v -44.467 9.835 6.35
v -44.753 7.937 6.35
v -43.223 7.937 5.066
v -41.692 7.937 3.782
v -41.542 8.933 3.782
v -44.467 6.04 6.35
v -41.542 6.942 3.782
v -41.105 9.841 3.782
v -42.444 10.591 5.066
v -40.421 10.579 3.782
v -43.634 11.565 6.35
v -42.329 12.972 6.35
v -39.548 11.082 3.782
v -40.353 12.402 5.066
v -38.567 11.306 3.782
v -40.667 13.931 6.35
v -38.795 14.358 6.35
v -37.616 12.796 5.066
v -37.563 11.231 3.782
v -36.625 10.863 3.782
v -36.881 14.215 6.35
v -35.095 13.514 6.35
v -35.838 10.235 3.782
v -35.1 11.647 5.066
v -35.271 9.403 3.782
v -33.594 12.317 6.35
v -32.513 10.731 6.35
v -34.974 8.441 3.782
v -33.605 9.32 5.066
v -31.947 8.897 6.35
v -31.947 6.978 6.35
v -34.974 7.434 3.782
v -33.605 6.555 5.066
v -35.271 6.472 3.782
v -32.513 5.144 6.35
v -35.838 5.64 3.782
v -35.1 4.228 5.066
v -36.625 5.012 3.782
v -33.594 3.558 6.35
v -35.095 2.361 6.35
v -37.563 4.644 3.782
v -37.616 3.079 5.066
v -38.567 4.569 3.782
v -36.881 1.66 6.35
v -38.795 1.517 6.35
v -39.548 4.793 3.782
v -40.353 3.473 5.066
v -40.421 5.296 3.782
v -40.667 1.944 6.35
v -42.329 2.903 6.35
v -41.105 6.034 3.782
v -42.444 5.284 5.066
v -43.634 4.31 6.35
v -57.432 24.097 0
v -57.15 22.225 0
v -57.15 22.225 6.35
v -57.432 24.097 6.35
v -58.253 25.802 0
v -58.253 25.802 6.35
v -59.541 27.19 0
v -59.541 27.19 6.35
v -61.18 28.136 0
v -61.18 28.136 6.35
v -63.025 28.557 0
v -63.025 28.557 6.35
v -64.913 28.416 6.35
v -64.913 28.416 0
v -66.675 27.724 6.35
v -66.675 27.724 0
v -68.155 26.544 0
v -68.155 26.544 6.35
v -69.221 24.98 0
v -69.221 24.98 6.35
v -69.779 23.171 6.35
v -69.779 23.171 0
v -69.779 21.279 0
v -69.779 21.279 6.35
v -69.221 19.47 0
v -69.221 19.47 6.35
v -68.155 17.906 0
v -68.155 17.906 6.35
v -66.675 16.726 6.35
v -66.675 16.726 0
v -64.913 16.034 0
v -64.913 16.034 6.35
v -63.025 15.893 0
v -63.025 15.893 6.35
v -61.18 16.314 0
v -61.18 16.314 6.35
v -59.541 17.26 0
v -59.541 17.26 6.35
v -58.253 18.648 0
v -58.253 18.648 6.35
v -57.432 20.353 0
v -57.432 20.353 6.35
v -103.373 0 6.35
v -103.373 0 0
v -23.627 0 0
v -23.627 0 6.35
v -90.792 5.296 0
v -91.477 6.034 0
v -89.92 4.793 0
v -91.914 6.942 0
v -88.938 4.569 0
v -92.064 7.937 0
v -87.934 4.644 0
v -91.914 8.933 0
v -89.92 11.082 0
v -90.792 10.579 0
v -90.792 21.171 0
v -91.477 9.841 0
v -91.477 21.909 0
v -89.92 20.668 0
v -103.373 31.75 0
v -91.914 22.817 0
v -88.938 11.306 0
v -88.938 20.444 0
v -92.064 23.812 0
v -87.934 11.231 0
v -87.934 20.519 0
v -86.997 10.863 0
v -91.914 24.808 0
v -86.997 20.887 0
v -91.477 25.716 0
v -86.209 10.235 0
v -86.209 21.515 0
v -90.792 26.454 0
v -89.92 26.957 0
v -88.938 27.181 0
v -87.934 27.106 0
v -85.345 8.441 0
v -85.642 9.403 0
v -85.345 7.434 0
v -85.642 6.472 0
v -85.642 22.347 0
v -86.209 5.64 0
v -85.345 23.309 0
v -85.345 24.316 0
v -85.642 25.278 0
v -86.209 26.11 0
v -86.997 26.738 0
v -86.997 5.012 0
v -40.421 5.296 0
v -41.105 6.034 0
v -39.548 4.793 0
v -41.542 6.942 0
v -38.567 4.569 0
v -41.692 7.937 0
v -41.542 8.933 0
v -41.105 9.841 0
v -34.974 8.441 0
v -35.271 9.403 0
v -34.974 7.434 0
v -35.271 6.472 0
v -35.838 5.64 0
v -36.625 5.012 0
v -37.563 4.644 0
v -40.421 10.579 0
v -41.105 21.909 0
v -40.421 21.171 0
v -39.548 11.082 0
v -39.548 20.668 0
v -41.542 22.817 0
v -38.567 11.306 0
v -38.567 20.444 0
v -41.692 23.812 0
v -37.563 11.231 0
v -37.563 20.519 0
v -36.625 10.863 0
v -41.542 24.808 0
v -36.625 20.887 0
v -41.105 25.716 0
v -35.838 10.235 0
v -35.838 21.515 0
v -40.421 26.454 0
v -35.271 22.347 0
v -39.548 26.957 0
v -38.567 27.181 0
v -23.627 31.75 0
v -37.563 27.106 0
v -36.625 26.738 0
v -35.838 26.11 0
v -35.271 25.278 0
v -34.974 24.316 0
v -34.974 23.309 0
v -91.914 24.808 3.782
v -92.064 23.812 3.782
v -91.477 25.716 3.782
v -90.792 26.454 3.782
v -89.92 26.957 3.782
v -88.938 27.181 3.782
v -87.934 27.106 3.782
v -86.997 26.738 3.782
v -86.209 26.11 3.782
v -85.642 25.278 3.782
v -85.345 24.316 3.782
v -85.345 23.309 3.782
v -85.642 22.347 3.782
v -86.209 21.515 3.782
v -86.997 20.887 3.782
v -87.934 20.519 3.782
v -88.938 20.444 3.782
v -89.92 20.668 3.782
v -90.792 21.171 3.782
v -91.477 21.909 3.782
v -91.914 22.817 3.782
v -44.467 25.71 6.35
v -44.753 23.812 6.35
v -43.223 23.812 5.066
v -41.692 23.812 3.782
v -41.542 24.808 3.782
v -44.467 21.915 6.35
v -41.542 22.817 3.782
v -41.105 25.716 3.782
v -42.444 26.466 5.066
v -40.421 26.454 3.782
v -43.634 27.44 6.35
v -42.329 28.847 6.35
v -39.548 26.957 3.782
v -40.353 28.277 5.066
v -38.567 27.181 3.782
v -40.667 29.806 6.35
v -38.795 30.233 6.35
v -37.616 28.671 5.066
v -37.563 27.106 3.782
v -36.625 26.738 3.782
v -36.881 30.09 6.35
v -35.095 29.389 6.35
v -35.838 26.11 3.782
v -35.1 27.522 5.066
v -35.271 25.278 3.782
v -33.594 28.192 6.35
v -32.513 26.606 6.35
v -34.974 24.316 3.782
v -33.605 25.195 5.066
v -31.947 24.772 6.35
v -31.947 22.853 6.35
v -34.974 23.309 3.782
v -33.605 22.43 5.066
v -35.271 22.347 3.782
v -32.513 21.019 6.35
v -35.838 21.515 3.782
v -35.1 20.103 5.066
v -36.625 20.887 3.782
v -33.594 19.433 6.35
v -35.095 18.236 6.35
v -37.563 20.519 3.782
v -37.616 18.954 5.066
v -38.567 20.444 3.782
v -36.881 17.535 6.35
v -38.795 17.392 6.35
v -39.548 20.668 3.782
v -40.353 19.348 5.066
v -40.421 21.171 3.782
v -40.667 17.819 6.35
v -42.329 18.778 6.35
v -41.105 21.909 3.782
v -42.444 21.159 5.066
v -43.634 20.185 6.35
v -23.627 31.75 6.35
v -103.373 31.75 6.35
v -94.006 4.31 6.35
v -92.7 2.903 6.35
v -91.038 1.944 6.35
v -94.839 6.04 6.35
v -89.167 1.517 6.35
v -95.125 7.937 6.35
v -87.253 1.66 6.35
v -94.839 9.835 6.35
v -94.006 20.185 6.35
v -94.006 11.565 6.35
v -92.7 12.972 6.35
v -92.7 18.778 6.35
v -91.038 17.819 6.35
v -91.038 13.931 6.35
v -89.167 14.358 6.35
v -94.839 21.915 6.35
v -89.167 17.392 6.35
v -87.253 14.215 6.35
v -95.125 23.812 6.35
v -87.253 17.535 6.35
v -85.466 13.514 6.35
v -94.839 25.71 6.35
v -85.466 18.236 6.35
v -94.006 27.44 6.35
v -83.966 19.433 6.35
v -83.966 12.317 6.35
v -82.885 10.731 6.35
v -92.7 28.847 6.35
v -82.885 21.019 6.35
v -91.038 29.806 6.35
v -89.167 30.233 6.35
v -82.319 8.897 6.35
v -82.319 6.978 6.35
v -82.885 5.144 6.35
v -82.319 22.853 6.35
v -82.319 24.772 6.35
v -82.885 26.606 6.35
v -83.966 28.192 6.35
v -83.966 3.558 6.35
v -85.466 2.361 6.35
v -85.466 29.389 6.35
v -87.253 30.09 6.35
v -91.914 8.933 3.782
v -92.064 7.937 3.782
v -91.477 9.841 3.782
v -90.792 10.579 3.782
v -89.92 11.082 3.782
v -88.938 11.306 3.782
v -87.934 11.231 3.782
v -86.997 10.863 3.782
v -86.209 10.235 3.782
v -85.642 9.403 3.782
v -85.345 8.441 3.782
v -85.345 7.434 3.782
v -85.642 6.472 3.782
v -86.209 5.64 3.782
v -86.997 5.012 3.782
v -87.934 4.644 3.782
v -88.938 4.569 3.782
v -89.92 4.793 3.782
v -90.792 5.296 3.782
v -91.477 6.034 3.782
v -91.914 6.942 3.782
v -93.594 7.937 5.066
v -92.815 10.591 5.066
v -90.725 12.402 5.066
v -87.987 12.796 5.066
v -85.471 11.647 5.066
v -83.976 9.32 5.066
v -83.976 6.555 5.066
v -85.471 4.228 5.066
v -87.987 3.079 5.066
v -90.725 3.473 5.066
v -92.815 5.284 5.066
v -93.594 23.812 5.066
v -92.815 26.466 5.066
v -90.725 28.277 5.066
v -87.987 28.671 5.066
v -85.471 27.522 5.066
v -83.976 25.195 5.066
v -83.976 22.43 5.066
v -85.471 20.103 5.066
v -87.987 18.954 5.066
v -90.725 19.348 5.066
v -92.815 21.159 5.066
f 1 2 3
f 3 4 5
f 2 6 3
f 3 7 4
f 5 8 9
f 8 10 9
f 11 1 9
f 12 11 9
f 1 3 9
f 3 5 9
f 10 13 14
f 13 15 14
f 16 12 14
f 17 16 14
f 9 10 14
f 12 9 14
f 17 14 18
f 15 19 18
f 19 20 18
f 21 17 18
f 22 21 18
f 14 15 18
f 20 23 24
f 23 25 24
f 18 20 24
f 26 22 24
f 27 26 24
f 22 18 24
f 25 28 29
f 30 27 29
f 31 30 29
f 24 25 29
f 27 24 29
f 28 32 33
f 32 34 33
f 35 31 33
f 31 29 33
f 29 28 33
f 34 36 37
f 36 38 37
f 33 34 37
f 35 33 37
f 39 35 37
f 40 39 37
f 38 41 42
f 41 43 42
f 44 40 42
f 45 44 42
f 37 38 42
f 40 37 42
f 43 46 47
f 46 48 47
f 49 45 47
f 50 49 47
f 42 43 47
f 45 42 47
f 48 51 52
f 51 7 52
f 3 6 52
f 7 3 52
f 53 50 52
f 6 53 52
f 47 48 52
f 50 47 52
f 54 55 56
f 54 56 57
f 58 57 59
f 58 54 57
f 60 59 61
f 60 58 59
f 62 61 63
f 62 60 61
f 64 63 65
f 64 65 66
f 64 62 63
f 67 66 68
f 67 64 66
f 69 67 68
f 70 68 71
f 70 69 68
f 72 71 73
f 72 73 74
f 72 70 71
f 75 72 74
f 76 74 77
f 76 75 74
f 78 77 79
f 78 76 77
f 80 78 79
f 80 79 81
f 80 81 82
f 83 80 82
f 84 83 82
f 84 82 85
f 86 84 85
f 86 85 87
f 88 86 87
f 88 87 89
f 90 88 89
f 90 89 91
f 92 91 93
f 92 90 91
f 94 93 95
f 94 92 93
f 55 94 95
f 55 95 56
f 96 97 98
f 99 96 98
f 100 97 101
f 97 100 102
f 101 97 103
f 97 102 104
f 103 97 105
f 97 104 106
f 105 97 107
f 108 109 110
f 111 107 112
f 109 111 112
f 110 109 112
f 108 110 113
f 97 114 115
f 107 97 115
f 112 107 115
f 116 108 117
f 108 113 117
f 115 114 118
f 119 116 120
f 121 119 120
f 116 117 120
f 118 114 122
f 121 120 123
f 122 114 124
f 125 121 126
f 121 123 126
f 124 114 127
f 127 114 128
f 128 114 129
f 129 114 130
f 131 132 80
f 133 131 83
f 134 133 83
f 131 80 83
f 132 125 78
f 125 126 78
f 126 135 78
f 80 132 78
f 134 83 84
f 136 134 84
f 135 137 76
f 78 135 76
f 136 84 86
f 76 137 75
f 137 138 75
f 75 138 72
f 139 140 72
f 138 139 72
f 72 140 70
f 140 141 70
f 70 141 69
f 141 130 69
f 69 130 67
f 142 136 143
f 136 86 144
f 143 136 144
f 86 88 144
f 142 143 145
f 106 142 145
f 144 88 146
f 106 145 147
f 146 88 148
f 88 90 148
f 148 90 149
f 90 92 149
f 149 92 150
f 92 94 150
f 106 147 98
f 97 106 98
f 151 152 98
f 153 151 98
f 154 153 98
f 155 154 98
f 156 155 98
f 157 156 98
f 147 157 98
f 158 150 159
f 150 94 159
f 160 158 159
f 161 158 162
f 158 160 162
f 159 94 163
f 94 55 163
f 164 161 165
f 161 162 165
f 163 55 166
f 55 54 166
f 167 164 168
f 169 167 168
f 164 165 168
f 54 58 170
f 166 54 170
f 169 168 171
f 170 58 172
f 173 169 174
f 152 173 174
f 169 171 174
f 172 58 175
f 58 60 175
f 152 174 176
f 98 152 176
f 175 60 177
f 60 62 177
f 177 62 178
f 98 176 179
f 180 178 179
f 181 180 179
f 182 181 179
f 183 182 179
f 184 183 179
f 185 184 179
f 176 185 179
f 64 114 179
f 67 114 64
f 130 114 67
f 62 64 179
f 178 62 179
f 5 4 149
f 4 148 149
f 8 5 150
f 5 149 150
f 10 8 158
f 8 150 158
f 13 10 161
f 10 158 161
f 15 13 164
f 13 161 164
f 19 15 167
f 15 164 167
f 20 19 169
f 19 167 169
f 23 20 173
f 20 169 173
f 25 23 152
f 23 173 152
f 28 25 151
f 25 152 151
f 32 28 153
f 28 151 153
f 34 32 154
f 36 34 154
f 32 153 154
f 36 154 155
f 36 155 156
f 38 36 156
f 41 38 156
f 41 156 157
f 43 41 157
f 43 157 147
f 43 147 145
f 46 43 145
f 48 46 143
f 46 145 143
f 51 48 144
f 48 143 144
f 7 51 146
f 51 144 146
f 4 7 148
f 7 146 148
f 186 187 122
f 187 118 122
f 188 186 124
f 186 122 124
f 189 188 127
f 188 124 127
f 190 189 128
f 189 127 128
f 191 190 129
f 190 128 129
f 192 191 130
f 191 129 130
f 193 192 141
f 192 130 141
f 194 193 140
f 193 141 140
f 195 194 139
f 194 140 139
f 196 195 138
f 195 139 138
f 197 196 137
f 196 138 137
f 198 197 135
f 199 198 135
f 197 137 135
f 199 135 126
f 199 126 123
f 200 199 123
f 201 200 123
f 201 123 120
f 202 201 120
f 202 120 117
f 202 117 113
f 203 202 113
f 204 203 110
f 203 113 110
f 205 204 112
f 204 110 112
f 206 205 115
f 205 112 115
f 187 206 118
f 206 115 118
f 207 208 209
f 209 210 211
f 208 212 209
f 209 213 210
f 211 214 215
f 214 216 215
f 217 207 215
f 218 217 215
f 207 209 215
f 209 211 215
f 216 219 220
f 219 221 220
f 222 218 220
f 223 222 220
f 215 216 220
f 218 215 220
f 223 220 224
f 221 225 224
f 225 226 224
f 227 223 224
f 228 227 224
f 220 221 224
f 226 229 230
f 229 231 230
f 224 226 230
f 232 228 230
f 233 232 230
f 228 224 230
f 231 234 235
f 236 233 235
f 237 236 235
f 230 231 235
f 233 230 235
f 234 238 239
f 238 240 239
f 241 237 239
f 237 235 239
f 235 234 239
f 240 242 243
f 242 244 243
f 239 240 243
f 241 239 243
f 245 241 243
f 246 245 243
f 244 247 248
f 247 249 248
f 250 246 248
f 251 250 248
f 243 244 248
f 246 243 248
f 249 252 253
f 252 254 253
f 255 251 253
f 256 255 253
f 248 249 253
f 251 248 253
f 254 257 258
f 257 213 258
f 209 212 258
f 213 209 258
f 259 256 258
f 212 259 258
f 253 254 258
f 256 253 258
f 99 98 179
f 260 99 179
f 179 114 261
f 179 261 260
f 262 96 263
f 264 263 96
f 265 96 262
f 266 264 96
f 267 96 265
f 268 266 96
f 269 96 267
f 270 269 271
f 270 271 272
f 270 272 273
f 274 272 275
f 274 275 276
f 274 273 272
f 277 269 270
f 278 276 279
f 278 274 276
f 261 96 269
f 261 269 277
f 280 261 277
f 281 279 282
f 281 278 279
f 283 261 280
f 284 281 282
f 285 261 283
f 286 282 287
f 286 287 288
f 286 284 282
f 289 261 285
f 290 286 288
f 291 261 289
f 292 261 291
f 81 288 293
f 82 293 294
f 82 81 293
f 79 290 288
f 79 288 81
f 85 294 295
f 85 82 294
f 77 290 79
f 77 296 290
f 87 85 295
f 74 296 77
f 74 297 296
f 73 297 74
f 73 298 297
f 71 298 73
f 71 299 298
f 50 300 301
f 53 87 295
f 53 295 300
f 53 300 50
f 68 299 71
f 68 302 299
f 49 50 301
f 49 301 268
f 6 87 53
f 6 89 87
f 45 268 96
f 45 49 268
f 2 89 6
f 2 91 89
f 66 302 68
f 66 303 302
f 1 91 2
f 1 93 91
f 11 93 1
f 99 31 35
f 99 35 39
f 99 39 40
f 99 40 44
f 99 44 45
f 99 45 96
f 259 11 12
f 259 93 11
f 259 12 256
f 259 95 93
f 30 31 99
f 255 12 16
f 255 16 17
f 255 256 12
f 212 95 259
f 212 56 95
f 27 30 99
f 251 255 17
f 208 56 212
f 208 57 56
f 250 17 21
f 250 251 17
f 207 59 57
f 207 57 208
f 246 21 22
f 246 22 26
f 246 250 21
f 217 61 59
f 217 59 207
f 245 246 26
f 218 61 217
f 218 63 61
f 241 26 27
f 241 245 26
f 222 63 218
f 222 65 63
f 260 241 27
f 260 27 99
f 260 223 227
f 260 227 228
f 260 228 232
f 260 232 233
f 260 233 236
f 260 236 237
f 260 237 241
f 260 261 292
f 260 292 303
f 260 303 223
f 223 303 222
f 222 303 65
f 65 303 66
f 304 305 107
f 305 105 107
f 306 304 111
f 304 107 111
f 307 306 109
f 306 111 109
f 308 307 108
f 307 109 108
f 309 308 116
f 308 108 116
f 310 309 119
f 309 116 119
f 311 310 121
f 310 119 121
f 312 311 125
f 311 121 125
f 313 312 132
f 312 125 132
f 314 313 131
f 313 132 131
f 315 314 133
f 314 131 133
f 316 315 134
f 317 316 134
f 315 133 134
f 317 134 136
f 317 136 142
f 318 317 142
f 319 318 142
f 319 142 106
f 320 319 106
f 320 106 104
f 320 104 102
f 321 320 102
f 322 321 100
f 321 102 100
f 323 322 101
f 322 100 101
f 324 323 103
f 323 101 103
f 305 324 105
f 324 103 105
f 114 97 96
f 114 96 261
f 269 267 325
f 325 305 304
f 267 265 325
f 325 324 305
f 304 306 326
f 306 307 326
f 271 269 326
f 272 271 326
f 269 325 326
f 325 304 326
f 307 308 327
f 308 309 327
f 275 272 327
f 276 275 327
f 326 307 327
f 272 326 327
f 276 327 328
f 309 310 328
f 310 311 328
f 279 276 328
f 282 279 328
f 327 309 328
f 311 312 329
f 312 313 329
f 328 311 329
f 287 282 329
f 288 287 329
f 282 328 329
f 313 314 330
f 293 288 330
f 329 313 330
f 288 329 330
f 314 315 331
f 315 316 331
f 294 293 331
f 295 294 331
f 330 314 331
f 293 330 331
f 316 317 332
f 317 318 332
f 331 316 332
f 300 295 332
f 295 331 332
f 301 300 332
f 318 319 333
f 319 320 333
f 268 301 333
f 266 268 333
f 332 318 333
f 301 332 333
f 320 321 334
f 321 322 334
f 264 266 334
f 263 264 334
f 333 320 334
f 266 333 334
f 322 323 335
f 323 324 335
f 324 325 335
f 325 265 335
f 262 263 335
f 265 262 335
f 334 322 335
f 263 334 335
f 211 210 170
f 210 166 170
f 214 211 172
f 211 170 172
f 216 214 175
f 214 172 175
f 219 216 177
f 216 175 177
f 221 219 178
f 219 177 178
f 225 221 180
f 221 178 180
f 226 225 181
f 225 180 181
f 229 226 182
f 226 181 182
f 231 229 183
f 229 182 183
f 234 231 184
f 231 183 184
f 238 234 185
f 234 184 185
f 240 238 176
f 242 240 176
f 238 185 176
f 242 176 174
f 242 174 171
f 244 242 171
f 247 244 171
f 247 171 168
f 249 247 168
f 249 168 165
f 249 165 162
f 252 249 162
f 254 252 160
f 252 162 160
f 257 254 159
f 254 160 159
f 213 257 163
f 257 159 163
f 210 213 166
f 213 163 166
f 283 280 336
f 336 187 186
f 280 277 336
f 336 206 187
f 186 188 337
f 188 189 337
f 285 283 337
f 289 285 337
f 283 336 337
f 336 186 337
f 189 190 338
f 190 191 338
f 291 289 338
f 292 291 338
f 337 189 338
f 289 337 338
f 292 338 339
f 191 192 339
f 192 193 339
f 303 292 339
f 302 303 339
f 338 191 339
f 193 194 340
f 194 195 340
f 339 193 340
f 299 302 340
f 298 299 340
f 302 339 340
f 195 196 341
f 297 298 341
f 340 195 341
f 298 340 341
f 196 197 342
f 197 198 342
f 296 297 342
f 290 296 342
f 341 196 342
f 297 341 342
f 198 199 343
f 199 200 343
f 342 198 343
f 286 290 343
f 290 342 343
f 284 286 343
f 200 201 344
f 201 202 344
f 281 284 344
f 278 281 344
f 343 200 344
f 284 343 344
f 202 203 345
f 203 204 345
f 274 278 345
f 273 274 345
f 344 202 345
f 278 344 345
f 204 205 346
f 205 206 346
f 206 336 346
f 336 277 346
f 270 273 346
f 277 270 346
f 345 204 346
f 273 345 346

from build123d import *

# Parameters (mm, degrees)
SKETCH1_W                                           = 79.746162722
SKETCH1_H                                           = 31.75
SKETCH1_R                                           = 6.35
BOSS_EXTRUDE1_DEPTH                                 = 6.35
CSK_FOR_1_4_FLAT_HEAD_MACHINE_SCREW_100_D           = 6.7564
CSK_FOR_1_4_FLAT_HEAD_MACHINE_SCREW_100_CSINK_D     = 12.8778
CSK_FOR_1_4_FLAT_HEAD_MACHINE_SCREW_100_CSINK_ANGLE = 100


with BuildPart() as part:
    # Sketch1 → Boss-Extrude1 (new body)
    with BuildSketch(Plane.XY):
        with Locations((-63.5, 15.875)):
            Rectangle(SKETCH1_W, SKETCH1_H)
        with Locations((-63.5, 22.225)):
            Circle(SKETCH1_R, mode=Mode.SUBTRACT)
    extrude(amount=BOSS_EXTRUDE1_DEPTH)

    # CSK for 1/4 Flat Head Machine Screw (100)1 (through all)
    with Locations(Plane.XY.offset(6.35)):
        with Locations((-88.685760173, 23.8125), (-88.685760173, 7.9375), (-38.314239827, 7.9375), (-38.314239827, 23.8125)):
            CounterSinkHole(CSK_FOR_1_4_FLAT_HEAD_MACHINE_SCREW_100_D / 2, CSK_FOR_1_4_FLAT_HEAD_MACHINE_SCREW_100_CSINK_D / 2, counter_sink_angle=CSK_FOR_1_4_FLAT_HEAD_MACHINE_SCREW_100_CSINK_ANGLE)


solid = part.part
